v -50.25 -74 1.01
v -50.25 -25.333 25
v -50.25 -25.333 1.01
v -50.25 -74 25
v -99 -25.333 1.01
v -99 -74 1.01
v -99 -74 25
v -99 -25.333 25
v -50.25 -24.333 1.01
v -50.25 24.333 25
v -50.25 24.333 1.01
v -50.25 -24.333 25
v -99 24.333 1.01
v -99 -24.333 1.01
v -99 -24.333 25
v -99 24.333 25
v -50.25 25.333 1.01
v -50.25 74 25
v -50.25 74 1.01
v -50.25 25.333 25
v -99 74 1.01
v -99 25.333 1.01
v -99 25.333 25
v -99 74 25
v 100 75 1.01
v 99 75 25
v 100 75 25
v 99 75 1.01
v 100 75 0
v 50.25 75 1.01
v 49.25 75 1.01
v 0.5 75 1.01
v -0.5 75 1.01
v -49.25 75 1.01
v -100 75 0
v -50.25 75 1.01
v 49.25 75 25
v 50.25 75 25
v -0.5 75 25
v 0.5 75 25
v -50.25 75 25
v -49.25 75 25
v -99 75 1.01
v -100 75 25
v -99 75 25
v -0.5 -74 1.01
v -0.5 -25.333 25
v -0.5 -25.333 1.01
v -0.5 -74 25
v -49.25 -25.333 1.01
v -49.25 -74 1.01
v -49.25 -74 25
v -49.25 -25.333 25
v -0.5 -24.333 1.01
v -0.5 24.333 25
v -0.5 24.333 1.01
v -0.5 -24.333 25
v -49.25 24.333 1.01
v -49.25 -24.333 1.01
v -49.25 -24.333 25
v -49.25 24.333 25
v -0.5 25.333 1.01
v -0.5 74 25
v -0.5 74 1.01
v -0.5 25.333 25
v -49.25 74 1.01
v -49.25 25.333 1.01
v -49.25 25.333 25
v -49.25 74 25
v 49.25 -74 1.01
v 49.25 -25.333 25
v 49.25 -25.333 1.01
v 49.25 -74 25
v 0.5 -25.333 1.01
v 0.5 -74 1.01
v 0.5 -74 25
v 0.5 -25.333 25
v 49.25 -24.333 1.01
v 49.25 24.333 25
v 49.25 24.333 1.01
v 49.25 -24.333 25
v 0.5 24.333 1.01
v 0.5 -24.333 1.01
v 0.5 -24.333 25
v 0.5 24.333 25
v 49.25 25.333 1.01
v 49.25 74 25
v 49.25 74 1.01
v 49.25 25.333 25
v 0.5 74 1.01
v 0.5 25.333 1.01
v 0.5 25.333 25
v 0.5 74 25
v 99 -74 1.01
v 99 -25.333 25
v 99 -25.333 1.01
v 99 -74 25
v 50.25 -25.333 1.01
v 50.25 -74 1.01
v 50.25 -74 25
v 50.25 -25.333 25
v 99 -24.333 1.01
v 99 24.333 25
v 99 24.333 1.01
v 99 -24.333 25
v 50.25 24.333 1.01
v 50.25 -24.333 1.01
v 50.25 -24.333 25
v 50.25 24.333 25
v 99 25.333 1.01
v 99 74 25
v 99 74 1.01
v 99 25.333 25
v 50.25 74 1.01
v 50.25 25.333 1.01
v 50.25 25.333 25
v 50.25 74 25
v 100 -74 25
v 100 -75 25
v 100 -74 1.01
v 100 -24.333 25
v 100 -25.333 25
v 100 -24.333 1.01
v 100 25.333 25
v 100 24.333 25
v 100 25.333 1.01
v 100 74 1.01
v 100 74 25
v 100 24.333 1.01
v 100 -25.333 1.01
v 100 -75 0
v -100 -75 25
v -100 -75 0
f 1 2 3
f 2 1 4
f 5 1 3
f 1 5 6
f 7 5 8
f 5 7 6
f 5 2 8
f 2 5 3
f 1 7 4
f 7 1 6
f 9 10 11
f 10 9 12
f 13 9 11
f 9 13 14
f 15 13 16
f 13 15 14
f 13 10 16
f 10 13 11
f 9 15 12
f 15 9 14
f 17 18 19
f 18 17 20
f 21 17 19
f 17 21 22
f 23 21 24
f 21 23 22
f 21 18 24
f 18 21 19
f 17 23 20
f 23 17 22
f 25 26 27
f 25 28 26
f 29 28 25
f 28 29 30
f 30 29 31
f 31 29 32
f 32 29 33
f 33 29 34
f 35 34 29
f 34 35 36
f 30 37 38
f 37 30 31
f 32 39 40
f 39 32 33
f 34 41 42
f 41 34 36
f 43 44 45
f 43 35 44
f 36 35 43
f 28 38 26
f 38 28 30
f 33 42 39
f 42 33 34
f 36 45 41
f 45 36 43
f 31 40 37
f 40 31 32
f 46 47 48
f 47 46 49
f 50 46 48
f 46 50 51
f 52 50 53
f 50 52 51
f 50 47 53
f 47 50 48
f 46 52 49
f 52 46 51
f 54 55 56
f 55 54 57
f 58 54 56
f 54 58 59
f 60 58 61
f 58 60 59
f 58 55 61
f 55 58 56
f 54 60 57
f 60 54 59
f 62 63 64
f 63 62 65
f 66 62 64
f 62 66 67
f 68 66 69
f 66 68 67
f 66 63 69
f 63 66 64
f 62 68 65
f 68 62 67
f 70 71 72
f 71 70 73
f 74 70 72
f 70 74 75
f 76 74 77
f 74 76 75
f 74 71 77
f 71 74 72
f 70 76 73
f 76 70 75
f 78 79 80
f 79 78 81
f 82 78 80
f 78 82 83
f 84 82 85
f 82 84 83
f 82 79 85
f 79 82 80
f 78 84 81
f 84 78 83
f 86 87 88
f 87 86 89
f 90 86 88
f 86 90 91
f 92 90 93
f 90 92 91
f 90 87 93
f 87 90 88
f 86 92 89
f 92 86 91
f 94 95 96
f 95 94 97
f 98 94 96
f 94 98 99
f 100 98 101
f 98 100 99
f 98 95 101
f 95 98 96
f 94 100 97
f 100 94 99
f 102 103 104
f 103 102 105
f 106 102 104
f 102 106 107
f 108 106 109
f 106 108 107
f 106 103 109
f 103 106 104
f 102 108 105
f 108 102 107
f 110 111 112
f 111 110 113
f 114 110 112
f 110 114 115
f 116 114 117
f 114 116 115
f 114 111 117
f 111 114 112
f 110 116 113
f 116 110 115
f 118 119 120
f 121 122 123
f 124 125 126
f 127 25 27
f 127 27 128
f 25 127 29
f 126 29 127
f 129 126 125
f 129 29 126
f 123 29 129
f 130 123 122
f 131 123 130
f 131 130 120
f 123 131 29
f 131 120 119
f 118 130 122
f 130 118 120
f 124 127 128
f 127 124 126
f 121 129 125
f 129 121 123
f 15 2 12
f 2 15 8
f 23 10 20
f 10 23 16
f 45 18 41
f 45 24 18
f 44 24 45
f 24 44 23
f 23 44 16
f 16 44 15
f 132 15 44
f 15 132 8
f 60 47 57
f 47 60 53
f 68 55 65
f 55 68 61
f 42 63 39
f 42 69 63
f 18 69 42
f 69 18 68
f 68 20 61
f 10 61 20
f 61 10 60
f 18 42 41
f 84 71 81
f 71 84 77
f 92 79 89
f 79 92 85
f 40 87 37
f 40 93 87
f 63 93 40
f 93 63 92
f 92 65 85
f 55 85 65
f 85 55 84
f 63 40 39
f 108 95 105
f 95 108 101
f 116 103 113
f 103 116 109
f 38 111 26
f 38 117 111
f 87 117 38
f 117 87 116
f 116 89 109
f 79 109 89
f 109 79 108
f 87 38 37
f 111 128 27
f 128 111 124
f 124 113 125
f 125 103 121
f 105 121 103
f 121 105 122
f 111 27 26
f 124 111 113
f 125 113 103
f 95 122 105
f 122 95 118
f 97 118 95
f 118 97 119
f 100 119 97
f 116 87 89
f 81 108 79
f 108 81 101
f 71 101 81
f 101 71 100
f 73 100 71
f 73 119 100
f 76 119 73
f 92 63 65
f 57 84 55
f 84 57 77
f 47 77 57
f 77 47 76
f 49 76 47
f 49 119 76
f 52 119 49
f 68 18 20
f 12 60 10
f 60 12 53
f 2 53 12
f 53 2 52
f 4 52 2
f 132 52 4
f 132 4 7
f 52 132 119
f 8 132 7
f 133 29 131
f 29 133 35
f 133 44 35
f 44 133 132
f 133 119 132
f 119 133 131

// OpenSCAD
// Parametric component/organiser trays
// https://github.com/bendetat/parametric-component-organiser-trays

// Usage:
// Call tray() with no parameters for a 200x150x25 tray with 12 cutouts.
// Use optional parameters to set the dimensions, number of cutout rows and columns, and to remove horizontal and vertical slots (and the pins left behind) to make larger cutouts and different designs.
// Combine trays for some crazyness.
// Parameters:
//      trayX           The width of the tray (default 200)
//      trayY           The depth of the tray (default 150)
//      trayZ           The height of the tray (default 25)
//      wallThickness   The thickness of the tray walls (default 1)
//      insertCountX    Number of rows
//      insertCountY    Number of columns
//      removedHSlots   Array of [row,col] pairs indicating the horizontal slots to remove
//      removedVSlots   Array of [row,col] pairs indicating the vertical slots to remove
//      removedPins     Array of [row,col] pairs indicating the pins to remove

// Examples:
tray();
//tray(100,100,20,3,3,1); // 100x100, 3x3, 1mm walls
//singleMediumCutout();
//largeAndMediumCutouts();

// combined tray
//tray();
//tray(insertCountX=3, insertCountY=2);

module singleMediumCutout()
tray(
    removedHSlots = [[0,1]]   
);
module largeAndMediumCutouts()
tray(
    removedHSlots = [[0,1],[1,1]],
    removedVSlots = [[1,0],[1,1],[1,2]],
    removedPins = [[1,1]]
);




// Model code

module tray(trayX = 200, trayY = 150, trayZ = 25,insertCountX = 4, insertCountY = 3, wallThickness = 1, removedHSlots = [], removedVSlots = [], removedPins = []) {
    insertX = (trayX - wallThickness*(insertCountX + 1)) / insertCountX;
    insertY = (trayY - wallThickness*(insertCountY + 1))/insertCountY;
    
    echo(insertX, insertY);

    translate([-trayX/2,-trayY/2,0])
    difference() {
        cube([trayX, trayY, trayZ]);
        cutouts(insertX, insertY, trayZ, insertCountX, insertCountY, wallThickness);
        hSlots(insertX, insertY, trayZ, wallThickness, removedHSlots);
        vSlots(insertX, insertY, trayZ, wallThickness, removedVSlots );
        pins(insertX, insertY, trayZ, wallThickness, removedPins);
    }
}

module cutouts(insertX, insertY, trayZ, insertCountX, insertCountY, wallThickness) {
    for (x = [0:insertCountX]) {
        for (y = [0:insertCountY]) {
            color("pink")
            translate([
                insertX*x + wallThickness*(x + 1),
                insertY*y + wallThickness*(y + 1),
                wallThickness + 0.01
            ])
            cube([
               insertX,
                insertY,
                trayZ - wallThickness + 0.01
            ]);
        }
    }
}

module hSlots(insertX, insertY, trayZ, wallThickness, removedHSlots) {
    if (len(removedHSlots) != 0) {
        for (i = [0:len(removedHSlots)-1]) {
            x = removedHSlots[i][0];
            y = removedHSlots[i][1];
            translate([
                (insertX*x) + wallThickness*(x + 1),
                (insertY*y) + wallThickness*(y) - 0.01,
                wallThickness + 0.01
            ])
            cube([
                insertX,
                wallThickness + 0.02,
                trayZ - wallThickness
            ]);
        }
    }
}

module vSlots(insertX, insertY, trayZ, wallThickness, removedVSlots) {
    if (len(removedVSlots) != 0) {
        for (i = [0:len(removedVSlots)-1]) {
            x = removedVSlots[i][0];
            y = removedVSlots[i][1];
            translate([
                (insertX*x) + wallThickness*x - 0.01,
                (insertY*y) + wallThickness*(y + 1),
                wallThickness + 0.01
            ])
            cube([
                wallThickness + 0.02,
                insertY,
                trayZ - wallThickness
            ]);
        }
    }
}

module pins(insertX, insertY, trayZ, wallThickness, removedPins) {
    if (len(removedPins) != 0) {
        for (i = [0:len(removedPins) - 1]) {
            x = removedPins[i][0];
            y = removedPins[i][1];
            translate([
                (insertX*x) + wallThickness*x - 0.01,
                (insertY*y) + wallThickness*y - 0.01,
                wallThickness + 0.01
            ])
            cube([
                wallThickness + 0.02,
                wallThickness + 0.02,
                trayZ - wallThickness + 0.01
            ]);
        }
    }
}
